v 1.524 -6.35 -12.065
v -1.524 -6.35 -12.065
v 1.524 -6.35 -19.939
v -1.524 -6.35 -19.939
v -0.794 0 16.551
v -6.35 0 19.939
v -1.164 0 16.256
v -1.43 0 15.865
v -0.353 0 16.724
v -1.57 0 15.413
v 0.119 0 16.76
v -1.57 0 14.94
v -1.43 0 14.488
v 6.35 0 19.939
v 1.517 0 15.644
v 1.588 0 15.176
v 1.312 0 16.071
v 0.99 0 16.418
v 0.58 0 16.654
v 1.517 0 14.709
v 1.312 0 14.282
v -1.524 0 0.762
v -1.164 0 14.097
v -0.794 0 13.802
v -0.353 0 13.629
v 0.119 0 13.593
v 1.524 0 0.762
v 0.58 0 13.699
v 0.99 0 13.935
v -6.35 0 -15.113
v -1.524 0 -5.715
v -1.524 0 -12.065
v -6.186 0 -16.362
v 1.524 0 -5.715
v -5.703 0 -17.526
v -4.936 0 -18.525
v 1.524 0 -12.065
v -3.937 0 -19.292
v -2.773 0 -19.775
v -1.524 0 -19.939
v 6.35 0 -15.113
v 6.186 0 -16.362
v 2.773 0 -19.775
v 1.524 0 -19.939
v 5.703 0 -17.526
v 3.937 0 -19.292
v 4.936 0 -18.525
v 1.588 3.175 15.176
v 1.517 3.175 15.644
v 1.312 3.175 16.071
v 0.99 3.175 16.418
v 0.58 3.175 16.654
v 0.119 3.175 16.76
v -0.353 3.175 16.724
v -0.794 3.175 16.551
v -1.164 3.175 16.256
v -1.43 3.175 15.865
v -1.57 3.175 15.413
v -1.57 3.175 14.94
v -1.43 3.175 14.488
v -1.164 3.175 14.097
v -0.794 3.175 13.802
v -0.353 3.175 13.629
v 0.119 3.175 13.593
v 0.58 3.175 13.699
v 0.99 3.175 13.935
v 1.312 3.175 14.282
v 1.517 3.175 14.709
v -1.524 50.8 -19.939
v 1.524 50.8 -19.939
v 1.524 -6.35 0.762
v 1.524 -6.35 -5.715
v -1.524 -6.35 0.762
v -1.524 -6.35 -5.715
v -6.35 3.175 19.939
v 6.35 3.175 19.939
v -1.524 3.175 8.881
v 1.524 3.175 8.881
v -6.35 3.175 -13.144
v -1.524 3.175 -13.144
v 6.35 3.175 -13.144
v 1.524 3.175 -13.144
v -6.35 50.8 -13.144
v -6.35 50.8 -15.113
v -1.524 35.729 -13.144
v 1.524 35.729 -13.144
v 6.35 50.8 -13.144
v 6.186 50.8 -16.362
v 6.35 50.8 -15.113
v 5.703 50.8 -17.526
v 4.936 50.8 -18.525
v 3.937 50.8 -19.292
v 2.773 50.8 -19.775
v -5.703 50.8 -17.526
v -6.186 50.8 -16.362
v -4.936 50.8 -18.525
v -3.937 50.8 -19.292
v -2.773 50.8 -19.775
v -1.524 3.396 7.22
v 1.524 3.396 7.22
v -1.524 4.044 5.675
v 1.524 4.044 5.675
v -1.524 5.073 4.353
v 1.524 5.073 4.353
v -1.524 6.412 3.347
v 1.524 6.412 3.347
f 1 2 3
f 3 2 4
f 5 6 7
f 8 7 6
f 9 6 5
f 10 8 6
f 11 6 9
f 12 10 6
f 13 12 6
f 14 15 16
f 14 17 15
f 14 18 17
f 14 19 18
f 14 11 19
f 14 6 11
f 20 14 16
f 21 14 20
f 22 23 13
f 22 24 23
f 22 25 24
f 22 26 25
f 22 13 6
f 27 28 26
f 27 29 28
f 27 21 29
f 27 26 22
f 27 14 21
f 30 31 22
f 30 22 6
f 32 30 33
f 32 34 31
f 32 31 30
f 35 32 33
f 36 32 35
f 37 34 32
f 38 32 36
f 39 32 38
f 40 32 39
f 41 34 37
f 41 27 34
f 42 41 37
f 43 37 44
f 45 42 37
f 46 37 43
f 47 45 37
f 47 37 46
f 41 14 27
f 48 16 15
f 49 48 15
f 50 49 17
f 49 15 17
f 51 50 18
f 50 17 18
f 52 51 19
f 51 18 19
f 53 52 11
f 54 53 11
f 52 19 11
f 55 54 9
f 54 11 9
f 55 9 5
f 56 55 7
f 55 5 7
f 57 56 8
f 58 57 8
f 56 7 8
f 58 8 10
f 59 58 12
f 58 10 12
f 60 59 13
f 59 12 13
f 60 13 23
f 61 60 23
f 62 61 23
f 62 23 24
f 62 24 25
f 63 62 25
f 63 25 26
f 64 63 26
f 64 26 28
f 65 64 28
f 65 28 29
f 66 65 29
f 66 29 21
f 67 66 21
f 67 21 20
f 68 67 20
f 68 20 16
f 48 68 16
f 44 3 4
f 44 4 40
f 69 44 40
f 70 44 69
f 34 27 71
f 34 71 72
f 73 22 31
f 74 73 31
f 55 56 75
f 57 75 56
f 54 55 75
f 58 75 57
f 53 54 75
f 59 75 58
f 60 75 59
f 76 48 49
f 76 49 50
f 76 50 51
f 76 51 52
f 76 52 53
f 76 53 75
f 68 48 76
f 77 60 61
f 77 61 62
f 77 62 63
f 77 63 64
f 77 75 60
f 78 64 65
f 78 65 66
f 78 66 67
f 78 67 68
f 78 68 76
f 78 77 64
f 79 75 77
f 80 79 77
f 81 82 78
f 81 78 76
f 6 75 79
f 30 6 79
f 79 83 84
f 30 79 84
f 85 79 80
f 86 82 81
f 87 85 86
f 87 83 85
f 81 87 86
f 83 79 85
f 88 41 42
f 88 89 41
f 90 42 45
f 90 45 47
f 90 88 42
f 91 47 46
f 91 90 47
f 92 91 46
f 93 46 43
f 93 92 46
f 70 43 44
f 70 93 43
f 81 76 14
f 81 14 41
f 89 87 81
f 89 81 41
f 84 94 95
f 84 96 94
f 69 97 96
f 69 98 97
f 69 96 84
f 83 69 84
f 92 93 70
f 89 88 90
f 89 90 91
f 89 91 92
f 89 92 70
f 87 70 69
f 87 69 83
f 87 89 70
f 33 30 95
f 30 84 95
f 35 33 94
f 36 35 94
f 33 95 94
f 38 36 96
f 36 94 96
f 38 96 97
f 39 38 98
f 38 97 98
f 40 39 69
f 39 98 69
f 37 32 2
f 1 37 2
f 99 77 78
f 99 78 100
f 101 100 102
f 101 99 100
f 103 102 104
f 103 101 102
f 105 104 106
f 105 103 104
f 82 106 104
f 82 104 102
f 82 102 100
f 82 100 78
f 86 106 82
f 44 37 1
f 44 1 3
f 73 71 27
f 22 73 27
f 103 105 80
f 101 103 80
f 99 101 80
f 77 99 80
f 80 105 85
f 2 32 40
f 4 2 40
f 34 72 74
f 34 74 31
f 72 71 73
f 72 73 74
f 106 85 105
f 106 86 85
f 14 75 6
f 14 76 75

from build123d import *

# Parameters (mm, degrees)
BOSS_EXTRUDE1_DEPTH = 6.35
SKETCH1_3_W         = 6.477
SKETCH1_3_H         = 6.35
BOSS_EXTRUDE2_DEPTH = 1.524
SKETCH2_R           = 1.5875
CUT_EXTRUDE1_DEPTH  = 51.8
FILLET1_R           = 4.826
FILLET2_R           = 6.35
SKETCH4_W           = 4.826
SKETCH4_H           = 33.0835
CUT_EXTRUDE5_DEPTH  = 47.625


with BuildPart() as part:
    # Sketch1 → Boss-Extrude1 (new body, symmetric)
    with BuildSketch(Plane(origin=(0, 0, 0), x_dir=(0, 0, -1), z_dir=(1, 0, 0))):
        Polygon((-19.939, 3.175), (-19.939, 0), (19.939, 0), (19.939, 50.8), (13.1445, 50.8), (13.1445, 35.729333418), (-5.167312548, 3.175), align=None)
    extrude(amount=BOSS_EXTRUDE1_DEPTH, both=True)

    # Sketch1<3> → Boss-Extrude2 (add, symmetric)
    with BuildSketch(Plane(origin=(0, 0, 0), x_dir=(0, 0, -1), z_dir=(1, 0, 0))):
        Polygon((13.1445, 0), (12.065, 0), (12.065, -6.35), (19.939, -6.35), (19.939, 0), align=None)
        with Locations((2.4765, -3.175)):
            Rectangle(SKETCH1_3_W, SKETCH1_3_H)
    extrude(amount=BOSS_EXTRUDE2_DEPTH, both=True)

    # Sketch2 → Cut-Extrude1 (cut, through all)
    with BuildSketch(Plane.XZ):
        with Locations((0, 15.1765)):
            Circle(SKETCH2_R)
    extrude(amount=-CUT_EXTRUDE1_DEPTH, mode=Mode.SUBTRACT)

    # Fillet1
    fillet1_edges = [part.edges().sort_by_distance(p)[0] for p in [
        (-6.35, 25.4, -19.939),
        (6.35, 25.4, -19.939),
    ]]
    fillet(fillet1_edges, radius=FILLET1_R)

    # Fillet2
    fillet2_edges = [part.edges().sort_by_distance(p)[0] for p in [
        (0, 3.175, 5.167312548),
    ]]
    fillet(fillet2_edges, radius=FILLET2_R)

    # Sketch4 → Cut-Extrude5 (cut)
    with BuildSketch(Plane(origin=(0, 50.8, 0), x_dir=(1, 0, 0), z_dir=(0, 1, 0))):
        with Locations((-3.937, -3.39725)):
            Rectangle(SKETCH4_W, SKETCH4_H)
        with Locations((3.937, -3.39725)):
            Rectangle(SKETCH4_W, SKETCH4_H)
    extrude(amount=-CUT_EXTRUDE5_DEPTH, mode=Mode.SUBTRACT)


solid = part.part
